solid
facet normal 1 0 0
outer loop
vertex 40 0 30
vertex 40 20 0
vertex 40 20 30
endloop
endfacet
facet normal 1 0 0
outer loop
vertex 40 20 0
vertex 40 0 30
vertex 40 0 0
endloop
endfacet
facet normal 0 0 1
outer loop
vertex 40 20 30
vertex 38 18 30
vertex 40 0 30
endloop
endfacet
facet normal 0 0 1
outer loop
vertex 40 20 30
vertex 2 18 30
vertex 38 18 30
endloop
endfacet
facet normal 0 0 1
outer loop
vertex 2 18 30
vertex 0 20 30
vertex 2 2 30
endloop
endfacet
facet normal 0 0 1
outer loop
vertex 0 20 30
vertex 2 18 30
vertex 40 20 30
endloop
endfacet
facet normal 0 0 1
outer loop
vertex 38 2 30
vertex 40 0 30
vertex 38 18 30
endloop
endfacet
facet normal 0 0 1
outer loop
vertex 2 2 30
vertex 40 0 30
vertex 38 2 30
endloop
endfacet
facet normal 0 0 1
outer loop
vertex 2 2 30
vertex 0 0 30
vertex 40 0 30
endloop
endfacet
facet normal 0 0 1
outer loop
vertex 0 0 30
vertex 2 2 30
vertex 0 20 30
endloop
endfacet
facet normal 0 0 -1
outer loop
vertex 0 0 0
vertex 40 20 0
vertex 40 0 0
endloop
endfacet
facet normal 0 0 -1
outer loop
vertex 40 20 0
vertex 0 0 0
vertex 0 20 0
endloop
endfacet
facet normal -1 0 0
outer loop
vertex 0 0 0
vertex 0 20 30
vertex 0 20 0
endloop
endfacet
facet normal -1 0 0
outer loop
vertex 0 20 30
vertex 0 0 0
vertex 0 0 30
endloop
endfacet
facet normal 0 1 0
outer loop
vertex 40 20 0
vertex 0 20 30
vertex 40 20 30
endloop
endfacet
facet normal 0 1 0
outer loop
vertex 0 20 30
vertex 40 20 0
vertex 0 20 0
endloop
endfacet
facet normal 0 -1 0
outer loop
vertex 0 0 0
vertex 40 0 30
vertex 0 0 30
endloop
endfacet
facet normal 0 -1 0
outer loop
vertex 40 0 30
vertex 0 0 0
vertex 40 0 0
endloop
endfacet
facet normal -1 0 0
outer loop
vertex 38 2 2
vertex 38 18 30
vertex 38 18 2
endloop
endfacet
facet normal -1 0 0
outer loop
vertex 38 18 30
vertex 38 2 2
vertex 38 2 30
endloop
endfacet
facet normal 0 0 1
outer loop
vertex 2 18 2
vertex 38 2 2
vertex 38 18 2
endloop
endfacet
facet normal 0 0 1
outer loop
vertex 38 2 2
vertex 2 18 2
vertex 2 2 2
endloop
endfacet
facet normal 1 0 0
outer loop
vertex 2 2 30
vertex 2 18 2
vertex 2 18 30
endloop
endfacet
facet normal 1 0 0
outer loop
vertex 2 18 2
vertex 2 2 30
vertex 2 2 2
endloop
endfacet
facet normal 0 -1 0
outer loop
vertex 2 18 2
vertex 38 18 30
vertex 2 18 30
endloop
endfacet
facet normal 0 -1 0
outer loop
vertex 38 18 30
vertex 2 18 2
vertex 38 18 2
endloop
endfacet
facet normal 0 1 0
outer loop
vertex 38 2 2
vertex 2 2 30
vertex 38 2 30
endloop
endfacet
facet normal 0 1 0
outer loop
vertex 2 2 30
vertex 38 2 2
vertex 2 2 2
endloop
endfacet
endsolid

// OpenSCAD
// Parametric box with lid
width = 40;
height = 30;
depth = 20;
wall = 2;

// Main box
difference() {
    cube([width, depth, height]);
    translate([wall, wall, wall])
        cube([width-2*wall, depth-2*wall, height]);
}
